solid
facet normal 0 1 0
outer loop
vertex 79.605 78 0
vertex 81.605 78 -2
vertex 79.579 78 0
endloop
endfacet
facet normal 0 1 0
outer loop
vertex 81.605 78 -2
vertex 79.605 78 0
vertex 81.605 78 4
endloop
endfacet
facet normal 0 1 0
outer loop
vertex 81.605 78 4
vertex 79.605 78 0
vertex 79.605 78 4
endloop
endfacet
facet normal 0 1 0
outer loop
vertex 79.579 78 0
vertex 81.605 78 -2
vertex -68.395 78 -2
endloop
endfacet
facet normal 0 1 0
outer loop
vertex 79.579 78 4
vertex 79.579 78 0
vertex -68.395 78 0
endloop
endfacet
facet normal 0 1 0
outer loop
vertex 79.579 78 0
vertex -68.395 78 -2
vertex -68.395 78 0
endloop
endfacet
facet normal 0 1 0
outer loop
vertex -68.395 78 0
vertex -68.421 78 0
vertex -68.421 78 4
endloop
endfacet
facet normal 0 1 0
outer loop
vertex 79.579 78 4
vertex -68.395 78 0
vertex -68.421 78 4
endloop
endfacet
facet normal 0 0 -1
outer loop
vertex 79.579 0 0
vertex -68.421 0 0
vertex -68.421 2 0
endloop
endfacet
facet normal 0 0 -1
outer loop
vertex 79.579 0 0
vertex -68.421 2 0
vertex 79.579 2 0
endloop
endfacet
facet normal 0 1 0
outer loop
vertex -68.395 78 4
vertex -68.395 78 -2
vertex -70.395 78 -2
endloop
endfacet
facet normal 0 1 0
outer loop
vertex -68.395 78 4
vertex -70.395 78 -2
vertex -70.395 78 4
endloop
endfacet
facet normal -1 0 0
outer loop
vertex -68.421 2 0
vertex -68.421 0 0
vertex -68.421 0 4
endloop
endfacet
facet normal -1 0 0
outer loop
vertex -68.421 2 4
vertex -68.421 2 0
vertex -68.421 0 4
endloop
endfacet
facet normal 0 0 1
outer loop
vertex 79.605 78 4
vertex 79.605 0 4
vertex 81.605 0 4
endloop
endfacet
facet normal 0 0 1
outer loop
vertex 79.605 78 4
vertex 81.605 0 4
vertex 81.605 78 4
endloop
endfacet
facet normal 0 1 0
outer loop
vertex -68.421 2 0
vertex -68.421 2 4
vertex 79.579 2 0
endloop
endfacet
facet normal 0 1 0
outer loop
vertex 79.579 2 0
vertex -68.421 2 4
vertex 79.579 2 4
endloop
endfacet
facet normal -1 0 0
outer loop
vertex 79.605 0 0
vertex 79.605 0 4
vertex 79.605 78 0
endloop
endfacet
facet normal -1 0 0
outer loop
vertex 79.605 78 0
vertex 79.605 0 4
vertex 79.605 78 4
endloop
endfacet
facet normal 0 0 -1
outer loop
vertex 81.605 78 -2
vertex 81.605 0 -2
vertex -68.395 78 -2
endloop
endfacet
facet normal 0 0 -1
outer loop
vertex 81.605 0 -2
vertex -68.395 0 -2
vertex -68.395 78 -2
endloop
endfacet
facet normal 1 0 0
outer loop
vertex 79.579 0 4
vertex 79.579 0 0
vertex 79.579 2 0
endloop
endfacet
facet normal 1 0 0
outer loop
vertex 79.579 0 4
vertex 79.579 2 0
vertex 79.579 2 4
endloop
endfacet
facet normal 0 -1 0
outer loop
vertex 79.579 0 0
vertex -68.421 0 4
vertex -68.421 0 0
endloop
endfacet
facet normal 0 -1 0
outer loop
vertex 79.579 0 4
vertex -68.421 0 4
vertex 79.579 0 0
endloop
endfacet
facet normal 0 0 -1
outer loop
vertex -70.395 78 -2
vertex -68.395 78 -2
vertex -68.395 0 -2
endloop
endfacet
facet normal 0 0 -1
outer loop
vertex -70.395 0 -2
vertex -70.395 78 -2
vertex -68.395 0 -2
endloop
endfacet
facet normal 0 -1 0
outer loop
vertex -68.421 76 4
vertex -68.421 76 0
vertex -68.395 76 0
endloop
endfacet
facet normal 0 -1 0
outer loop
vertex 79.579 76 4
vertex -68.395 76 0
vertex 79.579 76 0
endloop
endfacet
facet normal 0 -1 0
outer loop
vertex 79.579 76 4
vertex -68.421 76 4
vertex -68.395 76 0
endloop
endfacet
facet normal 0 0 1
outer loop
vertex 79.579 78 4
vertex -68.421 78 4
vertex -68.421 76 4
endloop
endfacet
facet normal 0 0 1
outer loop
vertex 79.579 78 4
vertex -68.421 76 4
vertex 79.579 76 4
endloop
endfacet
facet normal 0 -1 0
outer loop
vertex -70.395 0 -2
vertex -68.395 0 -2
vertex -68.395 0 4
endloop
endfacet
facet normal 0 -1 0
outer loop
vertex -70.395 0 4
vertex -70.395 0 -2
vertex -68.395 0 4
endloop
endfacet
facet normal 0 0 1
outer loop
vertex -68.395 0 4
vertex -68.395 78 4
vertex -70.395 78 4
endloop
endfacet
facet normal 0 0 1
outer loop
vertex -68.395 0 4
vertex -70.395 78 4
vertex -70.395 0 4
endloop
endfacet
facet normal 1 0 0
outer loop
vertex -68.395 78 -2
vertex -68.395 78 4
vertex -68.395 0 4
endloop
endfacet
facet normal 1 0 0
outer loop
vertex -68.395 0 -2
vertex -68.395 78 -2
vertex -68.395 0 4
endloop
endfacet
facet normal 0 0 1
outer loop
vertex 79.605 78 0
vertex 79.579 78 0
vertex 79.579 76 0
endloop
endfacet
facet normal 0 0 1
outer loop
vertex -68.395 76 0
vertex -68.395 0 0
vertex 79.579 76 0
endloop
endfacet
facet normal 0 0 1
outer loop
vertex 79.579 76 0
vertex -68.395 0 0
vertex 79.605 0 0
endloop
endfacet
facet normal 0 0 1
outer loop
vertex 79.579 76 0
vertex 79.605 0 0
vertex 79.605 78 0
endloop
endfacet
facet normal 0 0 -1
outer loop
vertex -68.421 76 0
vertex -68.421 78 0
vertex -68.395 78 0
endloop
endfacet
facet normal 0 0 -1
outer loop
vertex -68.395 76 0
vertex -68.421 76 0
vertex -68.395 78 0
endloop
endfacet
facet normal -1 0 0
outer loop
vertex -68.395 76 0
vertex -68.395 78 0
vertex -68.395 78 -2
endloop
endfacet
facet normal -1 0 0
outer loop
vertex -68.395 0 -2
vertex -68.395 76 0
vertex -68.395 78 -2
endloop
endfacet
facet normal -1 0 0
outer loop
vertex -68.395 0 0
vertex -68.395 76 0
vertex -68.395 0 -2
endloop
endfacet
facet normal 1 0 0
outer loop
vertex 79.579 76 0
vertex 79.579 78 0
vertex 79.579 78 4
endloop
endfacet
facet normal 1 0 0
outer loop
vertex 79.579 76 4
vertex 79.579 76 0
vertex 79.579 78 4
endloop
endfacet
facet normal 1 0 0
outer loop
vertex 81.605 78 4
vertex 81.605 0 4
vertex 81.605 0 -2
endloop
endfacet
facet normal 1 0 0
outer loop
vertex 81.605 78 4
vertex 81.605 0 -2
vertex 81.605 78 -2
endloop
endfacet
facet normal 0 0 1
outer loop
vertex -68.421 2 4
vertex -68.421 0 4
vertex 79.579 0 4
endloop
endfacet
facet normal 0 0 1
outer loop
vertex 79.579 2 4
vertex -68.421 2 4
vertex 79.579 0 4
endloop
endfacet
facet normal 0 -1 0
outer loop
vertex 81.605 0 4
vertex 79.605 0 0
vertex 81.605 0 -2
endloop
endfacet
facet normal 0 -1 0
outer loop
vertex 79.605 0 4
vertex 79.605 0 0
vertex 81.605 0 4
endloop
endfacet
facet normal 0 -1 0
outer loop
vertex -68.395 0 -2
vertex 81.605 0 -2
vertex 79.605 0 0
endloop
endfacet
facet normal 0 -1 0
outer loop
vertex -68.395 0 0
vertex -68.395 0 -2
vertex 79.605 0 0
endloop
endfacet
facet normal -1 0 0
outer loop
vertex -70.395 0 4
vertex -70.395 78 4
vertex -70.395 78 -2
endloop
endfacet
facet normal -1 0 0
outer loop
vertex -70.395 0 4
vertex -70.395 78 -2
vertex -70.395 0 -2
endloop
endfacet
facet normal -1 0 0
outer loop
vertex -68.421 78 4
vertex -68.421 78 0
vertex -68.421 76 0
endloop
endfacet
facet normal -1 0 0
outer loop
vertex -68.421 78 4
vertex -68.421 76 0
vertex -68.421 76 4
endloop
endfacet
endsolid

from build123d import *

# Parameters (mm, degrees)
F0_W     = 148
F0_H     = 4
F2_DEPTH = 2
F1_W     = 148
F1_H     = 39
F3_DEPTH = 2
F5_W     = 78
F5_H     = 6
F6_DEPTH = 2
F7_W     = 78
F7_H     = 6
F8_DEPTH = 2


with BuildPart() as f2:
    # F0 (on Front) → F2 (new body)
    with BuildSketch(Plane.XZ):
        with Locations((5.578948, 2)):
            Rectangle(F0_W, F0_H)
    extrude(amount=-F2_DEPTH)


with BuildPart() as f3:
    # F1 (on Top) → F3 (new body)
    with BuildSketch(Plane.XY):
        with Locations((5.604558, 19.5)):
            Rectangle(F1_W, F1_H)
    extrude(amount=-F3_DEPTH)

    # F4: F3, F2 across face


with BuildPart() as f3_1:
    add(f3.part)
    add(f3.part.mirror(Plane(origin=(5.604558, 39, -1), x_dir=(-1, 0, 0), z_dir=(0, 1, 0))))
    add(f2.part.mirror(Plane(origin=(5.604558, 39, -1), x_dir=(-1, 0, 0), z_dir=(0, 1, 0))))

    # F7 (on face) → F8 (join)
    with BuildSketch(Plane.YZ.offset(79.604558)):
        with Locations((39, 1)):
            Rectangle(F7_W, F7_H)
    extrude(amount=F8_DEPTH)


with BuildPart() as f6:
    # F5 (on face) → F6 (new body)
    with BuildSketch(Plane(origin=(-68.395442, 0, 0), x_dir=(0, -1, 0), z_dir=(-1, 0, 0))):
        with Locations((-39, 1)):
            Rectangle(F5_W, F5_H)
    extrude(amount=F6_DEPTH)


solid = Compound([f2.part, f3_1.part, f6.part])
